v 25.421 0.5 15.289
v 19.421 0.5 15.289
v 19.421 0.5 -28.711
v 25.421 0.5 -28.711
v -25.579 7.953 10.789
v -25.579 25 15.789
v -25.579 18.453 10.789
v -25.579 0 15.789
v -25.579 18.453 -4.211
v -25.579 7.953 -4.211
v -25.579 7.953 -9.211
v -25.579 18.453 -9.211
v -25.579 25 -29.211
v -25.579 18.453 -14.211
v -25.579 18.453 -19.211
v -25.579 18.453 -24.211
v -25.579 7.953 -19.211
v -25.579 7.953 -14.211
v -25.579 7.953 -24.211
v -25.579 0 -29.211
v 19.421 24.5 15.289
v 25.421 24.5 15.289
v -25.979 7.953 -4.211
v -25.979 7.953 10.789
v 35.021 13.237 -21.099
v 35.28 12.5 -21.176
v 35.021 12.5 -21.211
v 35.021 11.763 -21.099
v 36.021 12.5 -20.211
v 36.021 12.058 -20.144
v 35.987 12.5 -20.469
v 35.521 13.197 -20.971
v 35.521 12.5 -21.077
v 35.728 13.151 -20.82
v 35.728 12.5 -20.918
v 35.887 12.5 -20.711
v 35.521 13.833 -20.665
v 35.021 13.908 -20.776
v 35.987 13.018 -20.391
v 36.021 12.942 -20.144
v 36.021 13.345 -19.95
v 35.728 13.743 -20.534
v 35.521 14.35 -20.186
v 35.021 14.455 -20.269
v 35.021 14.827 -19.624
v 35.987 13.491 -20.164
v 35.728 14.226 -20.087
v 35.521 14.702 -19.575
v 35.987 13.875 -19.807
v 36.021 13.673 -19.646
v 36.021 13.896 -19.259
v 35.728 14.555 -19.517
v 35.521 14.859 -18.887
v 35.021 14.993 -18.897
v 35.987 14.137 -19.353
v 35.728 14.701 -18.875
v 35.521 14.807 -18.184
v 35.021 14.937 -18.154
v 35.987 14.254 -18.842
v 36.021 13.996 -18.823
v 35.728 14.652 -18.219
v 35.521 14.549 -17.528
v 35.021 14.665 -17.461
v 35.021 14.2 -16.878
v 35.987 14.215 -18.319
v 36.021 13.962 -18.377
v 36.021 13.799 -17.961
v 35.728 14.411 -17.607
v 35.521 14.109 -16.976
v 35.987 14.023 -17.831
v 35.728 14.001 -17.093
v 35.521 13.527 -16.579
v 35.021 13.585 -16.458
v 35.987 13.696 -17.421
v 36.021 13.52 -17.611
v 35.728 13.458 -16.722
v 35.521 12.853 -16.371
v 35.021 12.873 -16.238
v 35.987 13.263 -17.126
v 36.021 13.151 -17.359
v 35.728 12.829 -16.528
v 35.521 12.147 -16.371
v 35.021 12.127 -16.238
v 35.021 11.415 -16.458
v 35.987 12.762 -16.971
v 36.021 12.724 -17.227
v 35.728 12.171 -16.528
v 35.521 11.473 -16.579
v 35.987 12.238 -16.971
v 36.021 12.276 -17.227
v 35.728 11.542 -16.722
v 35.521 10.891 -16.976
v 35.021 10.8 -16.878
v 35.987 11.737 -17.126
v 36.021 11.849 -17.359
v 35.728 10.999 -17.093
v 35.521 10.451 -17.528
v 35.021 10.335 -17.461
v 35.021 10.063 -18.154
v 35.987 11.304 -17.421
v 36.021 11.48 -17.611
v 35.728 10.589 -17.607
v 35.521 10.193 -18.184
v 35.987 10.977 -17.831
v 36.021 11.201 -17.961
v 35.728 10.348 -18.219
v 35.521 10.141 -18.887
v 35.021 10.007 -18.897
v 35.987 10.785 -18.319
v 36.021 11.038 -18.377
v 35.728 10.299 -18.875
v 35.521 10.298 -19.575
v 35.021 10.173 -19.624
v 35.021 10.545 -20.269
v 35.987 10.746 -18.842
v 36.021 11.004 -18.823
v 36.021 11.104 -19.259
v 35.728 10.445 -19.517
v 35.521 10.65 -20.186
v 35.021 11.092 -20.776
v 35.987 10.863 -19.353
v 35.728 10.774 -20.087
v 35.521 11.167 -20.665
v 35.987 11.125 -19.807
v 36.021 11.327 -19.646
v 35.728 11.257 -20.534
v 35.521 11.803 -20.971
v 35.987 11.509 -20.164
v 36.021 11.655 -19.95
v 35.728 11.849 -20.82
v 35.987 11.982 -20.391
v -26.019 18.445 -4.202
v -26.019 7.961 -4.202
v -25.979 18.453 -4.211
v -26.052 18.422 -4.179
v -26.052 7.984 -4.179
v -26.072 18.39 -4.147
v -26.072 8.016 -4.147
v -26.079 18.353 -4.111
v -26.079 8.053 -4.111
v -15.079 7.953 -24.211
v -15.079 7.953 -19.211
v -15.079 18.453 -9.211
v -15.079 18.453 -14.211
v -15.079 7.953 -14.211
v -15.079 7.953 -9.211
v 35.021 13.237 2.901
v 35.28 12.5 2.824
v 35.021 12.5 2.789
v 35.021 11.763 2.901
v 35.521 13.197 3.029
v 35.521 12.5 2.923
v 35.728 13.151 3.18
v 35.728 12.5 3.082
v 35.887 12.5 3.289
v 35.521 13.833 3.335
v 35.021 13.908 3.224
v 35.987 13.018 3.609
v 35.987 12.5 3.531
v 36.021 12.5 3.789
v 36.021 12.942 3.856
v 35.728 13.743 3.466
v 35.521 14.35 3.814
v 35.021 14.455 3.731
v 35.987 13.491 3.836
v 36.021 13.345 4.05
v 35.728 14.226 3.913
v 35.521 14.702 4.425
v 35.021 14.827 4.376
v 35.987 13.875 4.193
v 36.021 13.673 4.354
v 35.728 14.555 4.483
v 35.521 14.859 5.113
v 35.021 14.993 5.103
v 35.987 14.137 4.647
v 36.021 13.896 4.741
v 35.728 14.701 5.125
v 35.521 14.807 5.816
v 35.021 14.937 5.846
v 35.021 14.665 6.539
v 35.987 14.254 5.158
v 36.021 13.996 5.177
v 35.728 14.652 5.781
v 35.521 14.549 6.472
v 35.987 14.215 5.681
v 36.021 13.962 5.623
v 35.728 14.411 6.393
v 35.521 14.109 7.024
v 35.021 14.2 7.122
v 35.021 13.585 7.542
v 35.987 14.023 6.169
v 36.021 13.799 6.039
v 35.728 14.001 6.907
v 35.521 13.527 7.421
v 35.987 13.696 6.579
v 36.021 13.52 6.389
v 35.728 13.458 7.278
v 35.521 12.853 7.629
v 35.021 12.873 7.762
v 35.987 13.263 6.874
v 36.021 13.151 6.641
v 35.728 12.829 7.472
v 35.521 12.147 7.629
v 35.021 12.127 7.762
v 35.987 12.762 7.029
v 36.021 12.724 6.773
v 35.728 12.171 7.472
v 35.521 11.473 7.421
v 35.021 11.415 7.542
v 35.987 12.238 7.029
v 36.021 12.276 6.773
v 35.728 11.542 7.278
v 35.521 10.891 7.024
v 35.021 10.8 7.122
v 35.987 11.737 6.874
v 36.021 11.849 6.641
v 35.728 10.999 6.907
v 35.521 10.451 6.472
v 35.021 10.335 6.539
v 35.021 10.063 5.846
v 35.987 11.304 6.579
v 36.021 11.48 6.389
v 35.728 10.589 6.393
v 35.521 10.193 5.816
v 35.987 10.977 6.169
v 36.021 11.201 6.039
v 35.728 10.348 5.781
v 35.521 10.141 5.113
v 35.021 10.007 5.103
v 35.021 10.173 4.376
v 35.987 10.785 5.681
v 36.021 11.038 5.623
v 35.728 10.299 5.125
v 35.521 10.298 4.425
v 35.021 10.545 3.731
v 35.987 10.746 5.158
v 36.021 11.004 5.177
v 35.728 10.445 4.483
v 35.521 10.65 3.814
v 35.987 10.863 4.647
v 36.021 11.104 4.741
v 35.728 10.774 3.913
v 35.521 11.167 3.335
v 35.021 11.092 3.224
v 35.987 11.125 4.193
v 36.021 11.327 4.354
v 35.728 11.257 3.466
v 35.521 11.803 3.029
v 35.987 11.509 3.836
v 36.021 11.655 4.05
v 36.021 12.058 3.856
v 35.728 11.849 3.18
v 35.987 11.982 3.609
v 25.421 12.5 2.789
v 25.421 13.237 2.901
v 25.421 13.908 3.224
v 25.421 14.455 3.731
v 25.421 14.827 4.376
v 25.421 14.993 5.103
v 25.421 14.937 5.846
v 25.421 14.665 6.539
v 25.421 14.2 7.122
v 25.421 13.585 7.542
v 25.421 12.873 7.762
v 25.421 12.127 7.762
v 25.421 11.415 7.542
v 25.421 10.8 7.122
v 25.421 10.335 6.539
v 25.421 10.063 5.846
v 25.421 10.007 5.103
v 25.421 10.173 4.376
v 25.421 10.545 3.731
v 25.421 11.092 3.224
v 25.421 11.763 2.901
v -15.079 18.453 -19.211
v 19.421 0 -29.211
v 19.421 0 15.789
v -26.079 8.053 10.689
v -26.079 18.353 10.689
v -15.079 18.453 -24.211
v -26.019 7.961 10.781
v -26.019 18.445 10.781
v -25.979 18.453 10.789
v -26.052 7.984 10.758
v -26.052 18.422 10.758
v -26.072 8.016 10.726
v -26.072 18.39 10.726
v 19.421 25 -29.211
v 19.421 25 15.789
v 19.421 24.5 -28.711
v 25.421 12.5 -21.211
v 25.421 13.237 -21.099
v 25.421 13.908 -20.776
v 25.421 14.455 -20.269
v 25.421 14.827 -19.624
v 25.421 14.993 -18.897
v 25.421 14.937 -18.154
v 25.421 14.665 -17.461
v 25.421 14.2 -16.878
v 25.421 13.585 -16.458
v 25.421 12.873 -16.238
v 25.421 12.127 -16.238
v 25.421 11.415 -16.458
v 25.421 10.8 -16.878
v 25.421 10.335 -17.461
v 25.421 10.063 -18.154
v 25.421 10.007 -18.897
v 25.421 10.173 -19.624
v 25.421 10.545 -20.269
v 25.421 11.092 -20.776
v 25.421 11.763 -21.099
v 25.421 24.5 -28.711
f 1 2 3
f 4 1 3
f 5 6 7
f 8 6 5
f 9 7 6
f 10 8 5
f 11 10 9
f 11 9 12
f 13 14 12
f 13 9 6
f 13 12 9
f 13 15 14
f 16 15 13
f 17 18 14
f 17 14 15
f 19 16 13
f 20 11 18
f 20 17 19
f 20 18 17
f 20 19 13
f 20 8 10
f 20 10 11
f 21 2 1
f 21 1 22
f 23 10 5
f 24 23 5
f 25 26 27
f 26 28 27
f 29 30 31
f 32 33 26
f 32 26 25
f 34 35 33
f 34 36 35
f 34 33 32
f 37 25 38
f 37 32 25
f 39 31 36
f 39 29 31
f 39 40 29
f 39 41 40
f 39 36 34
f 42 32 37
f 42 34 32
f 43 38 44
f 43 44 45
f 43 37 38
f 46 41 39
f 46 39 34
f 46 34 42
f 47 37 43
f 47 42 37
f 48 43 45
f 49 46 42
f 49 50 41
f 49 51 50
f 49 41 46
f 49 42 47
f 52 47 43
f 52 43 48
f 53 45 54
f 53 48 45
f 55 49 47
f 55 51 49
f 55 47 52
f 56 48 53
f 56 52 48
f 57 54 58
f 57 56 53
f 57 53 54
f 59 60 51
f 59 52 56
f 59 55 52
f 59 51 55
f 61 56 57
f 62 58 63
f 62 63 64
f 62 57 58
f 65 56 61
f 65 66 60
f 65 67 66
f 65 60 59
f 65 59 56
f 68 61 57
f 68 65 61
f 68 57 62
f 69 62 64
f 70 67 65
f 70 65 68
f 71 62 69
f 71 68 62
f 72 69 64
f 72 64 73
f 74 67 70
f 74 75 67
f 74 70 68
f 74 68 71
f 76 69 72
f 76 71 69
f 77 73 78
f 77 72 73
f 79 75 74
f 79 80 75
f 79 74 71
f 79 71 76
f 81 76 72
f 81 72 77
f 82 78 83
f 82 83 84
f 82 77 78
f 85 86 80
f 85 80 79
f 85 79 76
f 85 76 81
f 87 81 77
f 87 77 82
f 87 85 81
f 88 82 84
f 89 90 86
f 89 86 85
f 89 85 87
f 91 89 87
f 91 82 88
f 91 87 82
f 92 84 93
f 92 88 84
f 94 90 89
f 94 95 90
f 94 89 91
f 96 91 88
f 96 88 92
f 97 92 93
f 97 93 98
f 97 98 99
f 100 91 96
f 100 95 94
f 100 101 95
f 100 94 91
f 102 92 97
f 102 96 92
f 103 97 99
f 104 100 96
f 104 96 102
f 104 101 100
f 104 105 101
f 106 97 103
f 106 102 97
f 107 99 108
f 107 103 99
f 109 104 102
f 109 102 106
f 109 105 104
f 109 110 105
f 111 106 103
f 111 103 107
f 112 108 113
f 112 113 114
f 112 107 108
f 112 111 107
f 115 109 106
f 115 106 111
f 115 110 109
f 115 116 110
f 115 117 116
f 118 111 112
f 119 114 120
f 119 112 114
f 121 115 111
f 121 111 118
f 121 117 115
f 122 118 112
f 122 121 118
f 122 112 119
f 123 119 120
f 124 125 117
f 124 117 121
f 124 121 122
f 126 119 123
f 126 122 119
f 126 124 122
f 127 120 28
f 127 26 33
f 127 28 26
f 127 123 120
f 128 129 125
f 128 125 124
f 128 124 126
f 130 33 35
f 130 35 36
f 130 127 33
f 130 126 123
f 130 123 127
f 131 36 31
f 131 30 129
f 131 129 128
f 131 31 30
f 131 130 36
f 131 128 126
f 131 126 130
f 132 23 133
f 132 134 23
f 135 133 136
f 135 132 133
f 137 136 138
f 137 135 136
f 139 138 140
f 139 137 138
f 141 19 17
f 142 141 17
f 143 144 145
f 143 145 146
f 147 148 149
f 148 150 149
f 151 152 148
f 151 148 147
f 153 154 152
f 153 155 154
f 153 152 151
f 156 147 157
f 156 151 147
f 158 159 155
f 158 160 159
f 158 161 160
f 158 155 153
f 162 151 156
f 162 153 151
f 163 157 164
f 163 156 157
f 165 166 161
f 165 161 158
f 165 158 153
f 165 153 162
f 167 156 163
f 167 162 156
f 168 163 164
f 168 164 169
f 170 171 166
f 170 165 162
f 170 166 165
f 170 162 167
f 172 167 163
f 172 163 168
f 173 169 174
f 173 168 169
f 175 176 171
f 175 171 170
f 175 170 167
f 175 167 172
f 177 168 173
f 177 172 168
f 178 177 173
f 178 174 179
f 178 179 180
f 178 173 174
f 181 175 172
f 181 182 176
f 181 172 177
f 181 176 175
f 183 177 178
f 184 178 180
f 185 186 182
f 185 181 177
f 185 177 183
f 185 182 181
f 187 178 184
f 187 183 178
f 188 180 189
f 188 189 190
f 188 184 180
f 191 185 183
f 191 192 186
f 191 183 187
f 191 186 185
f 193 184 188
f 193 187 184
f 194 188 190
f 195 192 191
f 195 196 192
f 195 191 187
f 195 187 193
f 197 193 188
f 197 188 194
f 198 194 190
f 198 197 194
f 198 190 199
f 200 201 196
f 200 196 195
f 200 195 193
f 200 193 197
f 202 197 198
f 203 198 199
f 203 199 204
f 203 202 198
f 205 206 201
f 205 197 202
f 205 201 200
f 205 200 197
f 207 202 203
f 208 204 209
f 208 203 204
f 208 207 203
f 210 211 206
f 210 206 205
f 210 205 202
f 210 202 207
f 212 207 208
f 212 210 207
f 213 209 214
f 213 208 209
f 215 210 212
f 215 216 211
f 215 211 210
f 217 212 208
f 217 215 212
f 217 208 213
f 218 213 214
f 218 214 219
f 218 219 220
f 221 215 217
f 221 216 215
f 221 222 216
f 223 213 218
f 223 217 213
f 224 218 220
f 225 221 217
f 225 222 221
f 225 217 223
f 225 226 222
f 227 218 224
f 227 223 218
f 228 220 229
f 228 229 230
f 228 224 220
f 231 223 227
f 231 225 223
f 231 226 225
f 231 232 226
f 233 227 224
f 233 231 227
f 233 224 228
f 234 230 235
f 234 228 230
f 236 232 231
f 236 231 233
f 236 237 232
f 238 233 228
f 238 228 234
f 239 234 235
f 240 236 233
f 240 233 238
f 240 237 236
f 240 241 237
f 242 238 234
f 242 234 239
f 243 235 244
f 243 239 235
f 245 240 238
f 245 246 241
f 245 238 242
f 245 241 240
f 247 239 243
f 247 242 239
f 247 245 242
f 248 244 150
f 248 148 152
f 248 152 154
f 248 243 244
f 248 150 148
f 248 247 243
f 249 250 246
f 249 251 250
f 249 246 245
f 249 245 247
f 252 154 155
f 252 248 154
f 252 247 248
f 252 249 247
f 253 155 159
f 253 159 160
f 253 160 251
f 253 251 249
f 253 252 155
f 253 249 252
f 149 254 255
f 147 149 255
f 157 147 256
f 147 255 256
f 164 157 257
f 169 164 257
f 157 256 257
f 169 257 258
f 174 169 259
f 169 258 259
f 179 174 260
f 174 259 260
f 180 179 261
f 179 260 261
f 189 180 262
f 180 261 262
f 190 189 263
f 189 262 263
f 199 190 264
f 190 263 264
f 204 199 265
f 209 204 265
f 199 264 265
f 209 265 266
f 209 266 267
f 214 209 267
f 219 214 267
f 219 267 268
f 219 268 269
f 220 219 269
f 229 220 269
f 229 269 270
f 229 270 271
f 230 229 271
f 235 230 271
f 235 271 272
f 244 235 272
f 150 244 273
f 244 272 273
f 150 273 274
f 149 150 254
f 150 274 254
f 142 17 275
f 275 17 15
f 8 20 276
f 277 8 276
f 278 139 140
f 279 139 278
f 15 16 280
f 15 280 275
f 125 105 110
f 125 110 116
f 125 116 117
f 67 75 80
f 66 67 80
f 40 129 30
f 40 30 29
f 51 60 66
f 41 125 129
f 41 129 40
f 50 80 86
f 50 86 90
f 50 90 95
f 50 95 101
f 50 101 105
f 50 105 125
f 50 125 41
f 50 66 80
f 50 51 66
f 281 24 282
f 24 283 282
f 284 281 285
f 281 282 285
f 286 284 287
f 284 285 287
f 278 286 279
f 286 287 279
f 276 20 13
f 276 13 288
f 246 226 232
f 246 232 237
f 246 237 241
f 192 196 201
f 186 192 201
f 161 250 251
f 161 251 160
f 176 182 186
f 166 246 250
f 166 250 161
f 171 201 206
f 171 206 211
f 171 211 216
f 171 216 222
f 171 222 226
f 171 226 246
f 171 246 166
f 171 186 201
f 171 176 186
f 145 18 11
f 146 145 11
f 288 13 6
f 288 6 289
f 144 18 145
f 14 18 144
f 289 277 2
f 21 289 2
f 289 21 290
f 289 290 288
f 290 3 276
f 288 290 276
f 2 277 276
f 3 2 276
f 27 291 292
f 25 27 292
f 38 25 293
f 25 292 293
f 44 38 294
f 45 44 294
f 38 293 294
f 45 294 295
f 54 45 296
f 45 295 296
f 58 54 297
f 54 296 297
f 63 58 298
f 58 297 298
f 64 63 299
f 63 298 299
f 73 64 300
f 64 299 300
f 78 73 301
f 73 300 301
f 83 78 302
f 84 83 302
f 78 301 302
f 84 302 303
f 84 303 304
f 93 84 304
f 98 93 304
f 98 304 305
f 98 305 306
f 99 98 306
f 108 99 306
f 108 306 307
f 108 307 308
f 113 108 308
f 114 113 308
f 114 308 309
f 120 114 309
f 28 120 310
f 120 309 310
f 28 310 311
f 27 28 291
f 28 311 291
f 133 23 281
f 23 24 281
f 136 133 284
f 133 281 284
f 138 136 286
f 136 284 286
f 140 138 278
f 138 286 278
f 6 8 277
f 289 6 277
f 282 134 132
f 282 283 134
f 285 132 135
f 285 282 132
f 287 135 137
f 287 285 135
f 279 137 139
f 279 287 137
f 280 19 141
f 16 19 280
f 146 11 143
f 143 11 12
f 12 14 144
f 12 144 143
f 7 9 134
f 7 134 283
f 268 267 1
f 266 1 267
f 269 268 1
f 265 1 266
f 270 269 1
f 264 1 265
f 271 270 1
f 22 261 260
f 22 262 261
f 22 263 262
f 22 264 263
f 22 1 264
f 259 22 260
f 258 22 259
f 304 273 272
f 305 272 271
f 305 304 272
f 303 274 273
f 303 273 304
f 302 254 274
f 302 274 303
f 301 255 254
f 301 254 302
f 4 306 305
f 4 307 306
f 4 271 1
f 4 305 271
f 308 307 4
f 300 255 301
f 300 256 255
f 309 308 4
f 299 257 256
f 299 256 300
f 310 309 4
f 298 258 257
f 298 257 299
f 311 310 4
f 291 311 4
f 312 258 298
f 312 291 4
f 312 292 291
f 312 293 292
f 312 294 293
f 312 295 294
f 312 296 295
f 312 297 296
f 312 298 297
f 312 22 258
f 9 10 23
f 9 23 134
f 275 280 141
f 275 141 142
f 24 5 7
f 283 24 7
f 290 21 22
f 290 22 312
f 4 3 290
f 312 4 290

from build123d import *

# Parameters (mm, degrees)
SKETCH1_W           = 45
SKETCH1_H           = 45
BOSS_EXTRUDE1_DEPTH = 25
SKETCH2_W           = 44
SKETCH2_H           = 24
BOSS_EXTRUDE2_DEPTH = 6
SKETCH3_R           = 2.5
BOSS_EXTRUDE3_DEPTH = 10.6
FILLET12_R          = 1
FILLET13_R          = 1
SKETCH4_W           = 5
SKETCH4_H           = 10.5
CUT_EXTRUDE1_DEPTH  = 10.5
SKETCH5_W           = 15
SKETCH5_H           = 10.5
BOSS_EXTRUDE4_DEPTH = 0.5
FILLET14_R          = 0.1


with BuildPart() as part:
    # Sketch1 → Boss-Extrude1 (new body)
    with BuildSketch(Plane(origin=(0, 0, 0), x_dir=(1, 0, 0), z_dir=(0, 1, 0))):
        with Locations((-3.078947368, 6.710526316)):
            Rectangle(SKETCH1_W, SKETCH1_H)
    extrude(amount=BOSS_EXTRUDE1_DEPTH)

    # Sketch2 → Boss-Extrude2 (add)
    with BuildSketch(Plane(origin=(19.421052632, 0, 0), x_dir=(0, 0, -1), z_dir=(1, 0, 0))):
        with Locations((6.710526316, 12.5)):
            Rectangle(SKETCH2_W, SKETCH2_H)
    extrude(amount=BOSS_EXTRUDE2_DEPTH)

    # Sketch3 → Boss-Extrude3 (add)
    with BuildSketch(Plane(origin=(25.421052632, 0, 0), x_dir=(0, 0, -1), z_dir=(1, 0, 0))):
        with Locations((18.710526316, 12.5)):
            Circle(SKETCH3_R)
        with Locations((-5.289473684, 12.5)):
            Circle(SKETCH3_R)
    extrude(amount=BOSS_EXTRUDE3_DEPTH)

    # Fillet12
    fillet12_edges = [part.edges().sort_by_distance(p)[0] for p in [
        (36.021052632, 12.5, 7.789473684),
    ]]
    fillet(fillet12_edges, radius=FILLET12_R)

    # Fillet13
    fillet13_edges = [part.edges().sort_by_distance(p)[0] for p in [
        (36.021052632, 12.5, -16.210526316),
    ]]
    fillet(fillet13_edges, radius=FILLET13_R)

    # Sketch4 → Cut-Extrude1 (cut)
    with BuildSketch(Plane.ZY.offset(25.578947368)):
        with Locations((-21.710526316, 13.203091604)):
            Rectangle(SKETCH4_W, SKETCH4_H)
        with Locations((-11.710526316, 13.203091604)):
            Rectangle(SKETCH4_W, SKETCH4_H)
    extrude(amount=-CUT_EXTRUDE1_DEPTH, mode=Mode.SUBTRACT)

    # Sketch5 → Boss-Extrude4 (add)
    with BuildSketch(Plane.ZY.offset(25.578947368)):
        with Locations((3.289473684, 13.203091604)):
            Rectangle(SKETCH5_W, SKETCH5_H)
    extrude(amount=BOSS_EXTRUDE4_DEPTH)

    # Fillet14
    fillet14_edges = [part.edges().sort_by_distance(p)[0] for p in [
        (-26.078947368, 13.203091604, -4.210526316),
        (-26.078947368, 7.953091604, 3.289473684),
        (-26.078947368, 13.203091604, 10.789473684),
        (-26.078947368, 18.453091604, 3.289473684),
    ]]
    fillet(fillet14_edges, radius=FILLET14_R)


solid = part.part
